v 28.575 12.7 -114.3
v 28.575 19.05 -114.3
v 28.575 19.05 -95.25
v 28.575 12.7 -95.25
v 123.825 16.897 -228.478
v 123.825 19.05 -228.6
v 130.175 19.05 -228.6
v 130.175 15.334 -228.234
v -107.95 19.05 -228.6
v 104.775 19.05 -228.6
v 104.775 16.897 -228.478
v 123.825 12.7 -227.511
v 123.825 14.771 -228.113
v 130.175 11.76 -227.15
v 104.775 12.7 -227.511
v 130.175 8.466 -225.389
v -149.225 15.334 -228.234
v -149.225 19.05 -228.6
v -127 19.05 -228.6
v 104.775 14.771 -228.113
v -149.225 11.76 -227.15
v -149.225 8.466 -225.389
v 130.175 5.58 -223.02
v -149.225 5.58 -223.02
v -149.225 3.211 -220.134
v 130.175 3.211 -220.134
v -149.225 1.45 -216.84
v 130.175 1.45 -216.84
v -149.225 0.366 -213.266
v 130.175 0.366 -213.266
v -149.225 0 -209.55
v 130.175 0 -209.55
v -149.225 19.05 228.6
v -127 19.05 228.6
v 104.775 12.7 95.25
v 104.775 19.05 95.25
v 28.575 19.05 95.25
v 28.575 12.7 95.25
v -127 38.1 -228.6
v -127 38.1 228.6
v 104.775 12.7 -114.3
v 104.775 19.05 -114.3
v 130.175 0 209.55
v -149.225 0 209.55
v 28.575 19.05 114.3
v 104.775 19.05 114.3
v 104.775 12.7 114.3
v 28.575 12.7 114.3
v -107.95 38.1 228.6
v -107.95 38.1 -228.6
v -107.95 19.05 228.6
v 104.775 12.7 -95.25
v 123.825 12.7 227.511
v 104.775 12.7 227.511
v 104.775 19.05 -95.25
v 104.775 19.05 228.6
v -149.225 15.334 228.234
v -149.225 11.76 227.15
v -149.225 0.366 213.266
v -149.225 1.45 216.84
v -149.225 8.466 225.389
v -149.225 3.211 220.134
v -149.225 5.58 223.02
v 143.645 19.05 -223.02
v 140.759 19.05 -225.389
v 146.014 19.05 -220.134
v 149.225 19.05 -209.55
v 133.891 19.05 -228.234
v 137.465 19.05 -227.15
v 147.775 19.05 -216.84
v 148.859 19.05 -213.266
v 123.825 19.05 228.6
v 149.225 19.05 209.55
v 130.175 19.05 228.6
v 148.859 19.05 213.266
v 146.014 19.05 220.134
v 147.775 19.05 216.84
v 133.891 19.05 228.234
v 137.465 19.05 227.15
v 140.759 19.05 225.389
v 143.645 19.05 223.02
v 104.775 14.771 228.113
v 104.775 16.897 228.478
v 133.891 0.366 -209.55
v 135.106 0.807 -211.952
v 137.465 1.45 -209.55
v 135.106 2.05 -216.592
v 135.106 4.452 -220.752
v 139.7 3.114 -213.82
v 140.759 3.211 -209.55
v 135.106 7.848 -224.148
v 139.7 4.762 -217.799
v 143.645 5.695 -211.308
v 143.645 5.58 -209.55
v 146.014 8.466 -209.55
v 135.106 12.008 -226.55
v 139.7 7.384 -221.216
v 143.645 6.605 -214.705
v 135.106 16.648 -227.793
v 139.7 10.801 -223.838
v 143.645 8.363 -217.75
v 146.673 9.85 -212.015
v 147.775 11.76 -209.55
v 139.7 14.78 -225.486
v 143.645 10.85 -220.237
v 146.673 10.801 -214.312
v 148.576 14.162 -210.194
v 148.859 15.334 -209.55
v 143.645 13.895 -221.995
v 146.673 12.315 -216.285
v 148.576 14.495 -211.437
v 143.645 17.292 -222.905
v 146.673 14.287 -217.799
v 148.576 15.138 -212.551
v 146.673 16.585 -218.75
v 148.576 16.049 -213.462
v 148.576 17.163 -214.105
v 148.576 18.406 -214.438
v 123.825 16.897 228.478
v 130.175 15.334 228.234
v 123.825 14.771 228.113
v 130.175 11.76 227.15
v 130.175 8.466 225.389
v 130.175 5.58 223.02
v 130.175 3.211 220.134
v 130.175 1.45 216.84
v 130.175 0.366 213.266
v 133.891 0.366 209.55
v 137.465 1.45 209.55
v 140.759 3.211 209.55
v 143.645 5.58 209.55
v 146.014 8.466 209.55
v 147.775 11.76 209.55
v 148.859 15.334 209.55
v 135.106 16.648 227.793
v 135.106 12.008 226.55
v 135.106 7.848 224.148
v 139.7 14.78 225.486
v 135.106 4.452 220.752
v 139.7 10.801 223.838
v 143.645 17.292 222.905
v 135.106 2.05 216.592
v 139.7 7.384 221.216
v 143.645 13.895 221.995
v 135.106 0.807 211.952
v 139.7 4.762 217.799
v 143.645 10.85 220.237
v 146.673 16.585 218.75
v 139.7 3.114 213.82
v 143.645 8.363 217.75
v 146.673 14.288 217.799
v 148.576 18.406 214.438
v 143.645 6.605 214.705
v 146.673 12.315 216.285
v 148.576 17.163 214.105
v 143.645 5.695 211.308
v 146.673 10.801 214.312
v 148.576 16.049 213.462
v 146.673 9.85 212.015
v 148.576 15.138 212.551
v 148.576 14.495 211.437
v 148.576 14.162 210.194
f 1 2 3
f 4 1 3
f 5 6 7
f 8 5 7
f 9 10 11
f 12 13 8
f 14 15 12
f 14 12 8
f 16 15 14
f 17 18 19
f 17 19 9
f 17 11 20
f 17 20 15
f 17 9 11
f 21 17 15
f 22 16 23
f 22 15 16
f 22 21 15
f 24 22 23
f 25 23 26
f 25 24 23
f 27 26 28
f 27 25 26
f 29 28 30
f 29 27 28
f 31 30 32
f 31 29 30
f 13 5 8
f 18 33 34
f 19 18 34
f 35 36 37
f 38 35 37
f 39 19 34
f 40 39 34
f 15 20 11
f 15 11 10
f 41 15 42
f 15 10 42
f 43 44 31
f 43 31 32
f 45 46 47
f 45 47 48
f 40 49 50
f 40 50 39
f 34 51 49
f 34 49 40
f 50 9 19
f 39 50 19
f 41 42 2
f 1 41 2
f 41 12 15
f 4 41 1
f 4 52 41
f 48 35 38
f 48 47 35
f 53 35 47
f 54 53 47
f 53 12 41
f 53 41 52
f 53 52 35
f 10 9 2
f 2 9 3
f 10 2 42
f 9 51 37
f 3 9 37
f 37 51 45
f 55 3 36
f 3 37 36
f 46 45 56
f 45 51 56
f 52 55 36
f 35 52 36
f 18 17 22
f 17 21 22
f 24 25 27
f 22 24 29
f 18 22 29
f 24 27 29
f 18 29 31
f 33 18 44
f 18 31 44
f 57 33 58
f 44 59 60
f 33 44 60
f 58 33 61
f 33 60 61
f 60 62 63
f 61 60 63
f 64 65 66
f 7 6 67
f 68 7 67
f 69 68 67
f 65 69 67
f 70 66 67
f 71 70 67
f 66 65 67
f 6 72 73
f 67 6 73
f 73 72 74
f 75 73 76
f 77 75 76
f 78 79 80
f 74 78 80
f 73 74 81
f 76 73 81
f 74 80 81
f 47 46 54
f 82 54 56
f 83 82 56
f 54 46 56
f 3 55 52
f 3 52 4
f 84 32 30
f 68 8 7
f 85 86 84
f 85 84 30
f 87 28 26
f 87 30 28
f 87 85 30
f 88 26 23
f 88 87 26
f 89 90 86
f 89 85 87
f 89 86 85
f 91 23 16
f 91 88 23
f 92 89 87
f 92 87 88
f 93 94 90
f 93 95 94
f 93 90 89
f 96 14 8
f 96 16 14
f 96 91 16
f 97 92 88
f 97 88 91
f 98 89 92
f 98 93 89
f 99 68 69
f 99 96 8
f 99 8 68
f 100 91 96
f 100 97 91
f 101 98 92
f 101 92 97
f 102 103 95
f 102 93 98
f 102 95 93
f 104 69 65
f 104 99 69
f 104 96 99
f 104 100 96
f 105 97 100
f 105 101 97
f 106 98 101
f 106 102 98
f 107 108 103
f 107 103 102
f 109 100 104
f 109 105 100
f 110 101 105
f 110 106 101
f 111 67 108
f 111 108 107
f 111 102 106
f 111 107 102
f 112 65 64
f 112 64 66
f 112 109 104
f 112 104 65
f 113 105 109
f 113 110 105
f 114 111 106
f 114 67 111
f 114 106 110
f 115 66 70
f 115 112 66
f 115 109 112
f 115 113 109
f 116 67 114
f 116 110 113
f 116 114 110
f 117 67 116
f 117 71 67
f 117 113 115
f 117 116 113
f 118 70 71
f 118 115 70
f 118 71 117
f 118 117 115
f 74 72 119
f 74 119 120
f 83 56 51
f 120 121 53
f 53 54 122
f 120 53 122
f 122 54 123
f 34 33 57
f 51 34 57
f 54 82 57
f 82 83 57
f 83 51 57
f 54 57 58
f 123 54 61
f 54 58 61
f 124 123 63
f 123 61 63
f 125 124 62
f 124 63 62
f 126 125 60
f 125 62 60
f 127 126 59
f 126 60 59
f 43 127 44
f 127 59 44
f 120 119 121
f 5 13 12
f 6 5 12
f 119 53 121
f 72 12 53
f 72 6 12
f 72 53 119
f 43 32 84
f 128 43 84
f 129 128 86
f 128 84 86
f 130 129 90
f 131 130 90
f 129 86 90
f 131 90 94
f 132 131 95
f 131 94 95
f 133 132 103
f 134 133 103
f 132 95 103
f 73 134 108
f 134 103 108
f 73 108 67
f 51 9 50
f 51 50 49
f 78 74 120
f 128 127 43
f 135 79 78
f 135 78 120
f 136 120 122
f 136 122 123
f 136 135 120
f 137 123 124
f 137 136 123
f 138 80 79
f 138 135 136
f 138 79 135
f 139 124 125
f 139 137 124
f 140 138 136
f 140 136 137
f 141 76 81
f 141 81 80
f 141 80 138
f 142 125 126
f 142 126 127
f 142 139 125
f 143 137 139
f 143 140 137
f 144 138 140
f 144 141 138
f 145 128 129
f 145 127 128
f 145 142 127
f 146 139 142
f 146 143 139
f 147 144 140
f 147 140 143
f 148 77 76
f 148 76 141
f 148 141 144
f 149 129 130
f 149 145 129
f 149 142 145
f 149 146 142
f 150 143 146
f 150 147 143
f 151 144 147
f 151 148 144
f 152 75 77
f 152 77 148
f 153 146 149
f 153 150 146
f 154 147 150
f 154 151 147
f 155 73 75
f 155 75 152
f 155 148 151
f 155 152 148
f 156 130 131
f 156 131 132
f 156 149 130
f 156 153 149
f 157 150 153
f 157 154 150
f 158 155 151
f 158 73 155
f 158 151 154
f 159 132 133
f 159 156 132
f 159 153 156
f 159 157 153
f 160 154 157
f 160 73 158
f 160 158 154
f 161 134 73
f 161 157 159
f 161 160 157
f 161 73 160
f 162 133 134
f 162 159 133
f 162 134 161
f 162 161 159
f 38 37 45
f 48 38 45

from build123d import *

# Parameters (mm, degrees)
F0_W         = 298.45
F0_H         = 457.2
F1_DEPTH     = 19.05
F3_W         = 19.05
F3_H         = 457.2
F4_DEPTH     = 6.35
F5_T1_DEPTH  = 327.025
F5_T3_DEPTH  = 419.1
F5_T5_DEPTH  = 47.625
F5_S9_W      = 19.05
F5_S9_H      = 19.05
F5_T10_DEPTH = 19.05
F5_S15_W     = 19.05
F5_S15_H     = 19.05
F5_T16_DEPTH = 19.05
F6_W         = 19.05
F6_H         = 457.2
F7_DEPTH     = 19.05
F8_W         = 76.2
F8_H         = 19.05
F9_DEPTH     = 6.35


# Not quite as in the source:
# - a fillet or chamfer that OpenCascade refuses, or shapes differently, is made with other operations: its cross-section is extruded or revolved along the edge and cut away or added


with BuildPart() as f1:
    # F0 (on Front) → F1 (new body)
    with BuildSketch(Plane.XZ):
        Rectangle(F0_W, F0_H)
    extrude(amount=-F1_DEPTH)

    # F3 (on face) → F4 (cut)
    with BuildSketch(Plane(origin=(0, 19.05, 0), x_dir=(-1, 0, 0), z_dir=(0, 1, 0))):
        with Locations((-114.3, 0)):
            Rectangle(F3_W, F3_H)
    extrude(amount=-F4_DEPTH, mode=Mode.SUBTRACT)

    # F5: fillet of radius 19.05 on 5 edges, made by hand

    # F5_s2 → F5_t1 (cut)
    with BuildSketch(Plane.YZ.offset(-196.85)):
        with BuildLine():
            ThreePointArc((19.05, -228.6), (5.5796158184, -223.0203841816), (0, -209.55))
            Line((0, -209.55), (0, -228.6))
            Line((0, -228.6), (19.05, -228.6))
        make_face()
        with BuildLine():
            ThreePointArc((19.05, 228.6), (5.5796158184, 223.0203841816), (0, 209.55))
            Line((0, 209.55), (0, 228.6))
            Line((0, 228.6), (19.05, 228.6))
        make_face()
    extrude(amount=F5_T1_DEPTH, mode=Mode.SUBTRACT)

    # F5_s4 → F5_t3 (cut)
    with BuildSketch(Plane.XY.offset(-209.55)):
        with BuildLine():
            ThreePointArc((130.175, 0), (143.6453841816, 5.5796158184), (149.225, 19.05))
            Line((149.225, 19.05), (149.225, 0))
            Line((149.225, 0), (130.175, 0))
        make_face()
    extrude(amount=F5_T3_DEPTH, mode=Mode.SUBTRACT)

    # F5_s6 → F5_t5 (cut)
    with BuildSketch(Plane.XZ.offset(-66.675)):
        with BuildLine():
            ThreePointArc((130.175, -228.6), (143.6453841816, -223.0203841816), (149.225, -209.55))
            Line((149.225, -209.55), (149.225, -228.6))
            Line((149.225, -228.6), (130.175, -228.6))
        make_face()
        with BuildLine():
            ThreePointArc((130.175, 228.6), (143.6453841816, 223.0203841816), (149.225, 209.55))
            Line((149.225, 209.55), (149.225, 228.6))
            Line((149.225, 228.6), (130.175, 228.6))
        make_face()
    extrude(amount=F5_T5_DEPTH, mode=Mode.SUBTRACT)


with BuildPart() as f5_tool8:
    # F5_s9 → F5_t10 (new body)
    with BuildSketch(Plane.YZ.offset(130.175)):
        with Locations((9.525, -219.075)):
            Rectangle(F5_S9_W, F5_S9_H)
    extrude(amount=F5_T10_DEPTH)

    # F5_s11 → F5_t12 (revolve, cut)
    with BuildSketch(Plane(origin=(130.175, 19.05, -209.55), x_dir=(0, 0.7071067812, 0.7071067812), z_dir=(0, 0.7071067812, -0.7071067812))):
        with BuildLine():
            ThreePointArc((0, -19.05), (19.05, 0), (0, 19.05))
            Line((0, 19.05), (0, -19.05))
        make_face()
    revolve(axis=Axis((130.175, 19.05, -209.55), (1, 0, 0)), mode=Mode.SUBTRACT)


with BuildPart() as f1_1:
    add(f1.part)

    # F5_t7: cut F5_tool8
    add(f5_tool8.part, mode=Mode.SUBTRACT)


with BuildPart() as f5_tool14:
    # F5_s15 → F5_t16 (new body)
    with BuildSketch(Plane.YZ.offset(130.175)):
        with Locations((9.525, 219.075)):
            Rectangle(F5_S15_W, F5_S15_H)
    extrude(amount=F5_T16_DEPTH)

    # F5_s17 → F5_t18 (revolve, cut)
    with BuildSketch(Plane(origin=(130.175, 19.05, 209.55), x_dir=(0, 0.7071067812, -0.7071067812), z_dir=(0, -0.7071067812, -0.7071067812))):
        with BuildLine():
            ThreePointArc((0, -19.05), (19.05, 0), (0, 19.05))
            Line((0, 19.05), (0, -19.05))
        make_face()
    revolve(axis=Axis((130.175, 19.05, 209.55), (1, 0, 0)), mode=Mode.SUBTRACT)


with BuildPart() as f1_2:
    add(f1_1.part)

    # F5_t13: cut F5_tool14
    add(f5_tool14.part, mode=Mode.SUBTRACT)

    # F6 (on face) → F7 (join)
    with BuildSketch(Plane(origin=(0, 19.05, 0), x_dir=(-1, 0, 0), z_dir=(0, 1, 0))):
        with Locations((117.475, 0)):
            Rectangle(F6_W, F6_H)
    extrude(amount=F7_DEPTH)

    # F8 (on face) → F9 (cut, through all)
    with BuildSketch(Plane(origin=(0, 19.05, 0), x_dir=(-1, 0, 0), z_dir=(0, 1, 0))):
        with Locations((-66.675, 104.775)):
            Rectangle(F8_W, F8_H)
        with Locations((-66.675, -104.775)):
            Rectangle(F8_W, F8_H)
    extrude(amount=-F9_DEPTH, mode=Mode.SUBTRACT)


solid = f1_2.part
